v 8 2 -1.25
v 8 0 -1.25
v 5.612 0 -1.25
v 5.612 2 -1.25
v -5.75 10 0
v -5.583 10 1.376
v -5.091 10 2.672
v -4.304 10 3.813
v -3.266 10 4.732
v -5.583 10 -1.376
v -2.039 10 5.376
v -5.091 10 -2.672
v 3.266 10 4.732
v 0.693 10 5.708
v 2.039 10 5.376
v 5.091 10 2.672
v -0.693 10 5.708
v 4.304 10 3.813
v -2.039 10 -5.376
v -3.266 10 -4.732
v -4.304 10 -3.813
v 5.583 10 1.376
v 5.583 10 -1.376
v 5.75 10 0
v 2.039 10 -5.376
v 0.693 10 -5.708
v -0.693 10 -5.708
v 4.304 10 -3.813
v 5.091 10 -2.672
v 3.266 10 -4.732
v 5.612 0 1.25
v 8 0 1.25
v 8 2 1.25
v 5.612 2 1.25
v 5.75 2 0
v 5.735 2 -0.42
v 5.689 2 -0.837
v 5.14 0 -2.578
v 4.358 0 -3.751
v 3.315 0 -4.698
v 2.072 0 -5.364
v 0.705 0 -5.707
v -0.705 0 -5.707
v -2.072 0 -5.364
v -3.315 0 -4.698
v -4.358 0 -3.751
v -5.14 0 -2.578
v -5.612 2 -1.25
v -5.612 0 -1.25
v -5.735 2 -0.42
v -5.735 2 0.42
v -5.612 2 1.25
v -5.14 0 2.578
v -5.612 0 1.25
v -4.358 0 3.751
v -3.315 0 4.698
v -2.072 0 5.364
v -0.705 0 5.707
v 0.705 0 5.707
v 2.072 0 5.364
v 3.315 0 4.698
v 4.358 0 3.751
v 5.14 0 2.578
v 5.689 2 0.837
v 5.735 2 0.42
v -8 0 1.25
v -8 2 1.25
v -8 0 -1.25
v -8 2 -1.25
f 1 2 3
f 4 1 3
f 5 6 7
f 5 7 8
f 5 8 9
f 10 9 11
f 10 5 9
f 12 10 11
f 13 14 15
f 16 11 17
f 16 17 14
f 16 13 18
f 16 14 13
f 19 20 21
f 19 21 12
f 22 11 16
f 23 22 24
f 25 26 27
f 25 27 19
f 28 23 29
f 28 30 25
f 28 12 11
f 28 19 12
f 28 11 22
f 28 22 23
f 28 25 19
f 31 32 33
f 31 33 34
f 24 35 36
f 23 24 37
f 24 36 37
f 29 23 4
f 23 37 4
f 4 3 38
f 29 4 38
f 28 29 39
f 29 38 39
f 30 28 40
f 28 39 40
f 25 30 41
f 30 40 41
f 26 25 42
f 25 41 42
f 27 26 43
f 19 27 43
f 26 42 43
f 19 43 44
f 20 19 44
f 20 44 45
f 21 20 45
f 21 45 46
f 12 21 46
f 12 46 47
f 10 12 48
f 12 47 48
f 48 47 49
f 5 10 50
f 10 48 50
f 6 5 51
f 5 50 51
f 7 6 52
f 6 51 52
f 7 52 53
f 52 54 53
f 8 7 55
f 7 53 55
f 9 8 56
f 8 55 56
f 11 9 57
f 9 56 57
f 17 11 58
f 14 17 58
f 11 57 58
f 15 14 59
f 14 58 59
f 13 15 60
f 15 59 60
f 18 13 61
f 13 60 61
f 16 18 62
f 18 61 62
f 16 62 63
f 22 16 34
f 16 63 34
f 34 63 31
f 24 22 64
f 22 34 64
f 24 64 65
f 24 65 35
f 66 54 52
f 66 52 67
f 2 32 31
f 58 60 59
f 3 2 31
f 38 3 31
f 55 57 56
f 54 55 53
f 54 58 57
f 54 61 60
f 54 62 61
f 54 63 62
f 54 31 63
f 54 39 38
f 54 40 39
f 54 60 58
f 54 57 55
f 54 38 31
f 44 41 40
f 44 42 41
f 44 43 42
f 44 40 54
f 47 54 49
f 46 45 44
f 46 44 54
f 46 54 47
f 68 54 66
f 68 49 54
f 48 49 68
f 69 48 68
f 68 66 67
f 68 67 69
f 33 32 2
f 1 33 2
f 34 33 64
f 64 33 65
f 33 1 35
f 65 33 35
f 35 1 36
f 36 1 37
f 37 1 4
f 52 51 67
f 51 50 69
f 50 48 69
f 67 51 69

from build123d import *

# Parameters (mm, degrees)
SKETCH1_R           = 5.75
BOSS_EXTRUDE1_DEPTH = 10
SKETCH2_W           = 16
SKETCH2_H           = 2.5
BOSS_EXTRUDE2_DEPTH = 2


with BuildPart() as part:
    # Sketch1 → Boss-Extrude1 (new body)
    with BuildSketch(Plane(origin=(0, 0, 0), x_dir=(1, 0, 0), z_dir=(0, 1, 0))):
        Circle(SKETCH1_R)
    extrude(amount=BOSS_EXTRUDE1_DEPTH)

    # Sketch2 → Boss-Extrude2 (add)
    with BuildSketch(Plane(origin=(0, 0, 0), x_dir=(-1, 0, 0), z_dir=(0, -1, 0))):
        Rectangle(SKETCH2_W, SKETCH2_H)
    extrude(amount=-BOSS_EXTRUDE2_DEPTH)


solid = part.part
